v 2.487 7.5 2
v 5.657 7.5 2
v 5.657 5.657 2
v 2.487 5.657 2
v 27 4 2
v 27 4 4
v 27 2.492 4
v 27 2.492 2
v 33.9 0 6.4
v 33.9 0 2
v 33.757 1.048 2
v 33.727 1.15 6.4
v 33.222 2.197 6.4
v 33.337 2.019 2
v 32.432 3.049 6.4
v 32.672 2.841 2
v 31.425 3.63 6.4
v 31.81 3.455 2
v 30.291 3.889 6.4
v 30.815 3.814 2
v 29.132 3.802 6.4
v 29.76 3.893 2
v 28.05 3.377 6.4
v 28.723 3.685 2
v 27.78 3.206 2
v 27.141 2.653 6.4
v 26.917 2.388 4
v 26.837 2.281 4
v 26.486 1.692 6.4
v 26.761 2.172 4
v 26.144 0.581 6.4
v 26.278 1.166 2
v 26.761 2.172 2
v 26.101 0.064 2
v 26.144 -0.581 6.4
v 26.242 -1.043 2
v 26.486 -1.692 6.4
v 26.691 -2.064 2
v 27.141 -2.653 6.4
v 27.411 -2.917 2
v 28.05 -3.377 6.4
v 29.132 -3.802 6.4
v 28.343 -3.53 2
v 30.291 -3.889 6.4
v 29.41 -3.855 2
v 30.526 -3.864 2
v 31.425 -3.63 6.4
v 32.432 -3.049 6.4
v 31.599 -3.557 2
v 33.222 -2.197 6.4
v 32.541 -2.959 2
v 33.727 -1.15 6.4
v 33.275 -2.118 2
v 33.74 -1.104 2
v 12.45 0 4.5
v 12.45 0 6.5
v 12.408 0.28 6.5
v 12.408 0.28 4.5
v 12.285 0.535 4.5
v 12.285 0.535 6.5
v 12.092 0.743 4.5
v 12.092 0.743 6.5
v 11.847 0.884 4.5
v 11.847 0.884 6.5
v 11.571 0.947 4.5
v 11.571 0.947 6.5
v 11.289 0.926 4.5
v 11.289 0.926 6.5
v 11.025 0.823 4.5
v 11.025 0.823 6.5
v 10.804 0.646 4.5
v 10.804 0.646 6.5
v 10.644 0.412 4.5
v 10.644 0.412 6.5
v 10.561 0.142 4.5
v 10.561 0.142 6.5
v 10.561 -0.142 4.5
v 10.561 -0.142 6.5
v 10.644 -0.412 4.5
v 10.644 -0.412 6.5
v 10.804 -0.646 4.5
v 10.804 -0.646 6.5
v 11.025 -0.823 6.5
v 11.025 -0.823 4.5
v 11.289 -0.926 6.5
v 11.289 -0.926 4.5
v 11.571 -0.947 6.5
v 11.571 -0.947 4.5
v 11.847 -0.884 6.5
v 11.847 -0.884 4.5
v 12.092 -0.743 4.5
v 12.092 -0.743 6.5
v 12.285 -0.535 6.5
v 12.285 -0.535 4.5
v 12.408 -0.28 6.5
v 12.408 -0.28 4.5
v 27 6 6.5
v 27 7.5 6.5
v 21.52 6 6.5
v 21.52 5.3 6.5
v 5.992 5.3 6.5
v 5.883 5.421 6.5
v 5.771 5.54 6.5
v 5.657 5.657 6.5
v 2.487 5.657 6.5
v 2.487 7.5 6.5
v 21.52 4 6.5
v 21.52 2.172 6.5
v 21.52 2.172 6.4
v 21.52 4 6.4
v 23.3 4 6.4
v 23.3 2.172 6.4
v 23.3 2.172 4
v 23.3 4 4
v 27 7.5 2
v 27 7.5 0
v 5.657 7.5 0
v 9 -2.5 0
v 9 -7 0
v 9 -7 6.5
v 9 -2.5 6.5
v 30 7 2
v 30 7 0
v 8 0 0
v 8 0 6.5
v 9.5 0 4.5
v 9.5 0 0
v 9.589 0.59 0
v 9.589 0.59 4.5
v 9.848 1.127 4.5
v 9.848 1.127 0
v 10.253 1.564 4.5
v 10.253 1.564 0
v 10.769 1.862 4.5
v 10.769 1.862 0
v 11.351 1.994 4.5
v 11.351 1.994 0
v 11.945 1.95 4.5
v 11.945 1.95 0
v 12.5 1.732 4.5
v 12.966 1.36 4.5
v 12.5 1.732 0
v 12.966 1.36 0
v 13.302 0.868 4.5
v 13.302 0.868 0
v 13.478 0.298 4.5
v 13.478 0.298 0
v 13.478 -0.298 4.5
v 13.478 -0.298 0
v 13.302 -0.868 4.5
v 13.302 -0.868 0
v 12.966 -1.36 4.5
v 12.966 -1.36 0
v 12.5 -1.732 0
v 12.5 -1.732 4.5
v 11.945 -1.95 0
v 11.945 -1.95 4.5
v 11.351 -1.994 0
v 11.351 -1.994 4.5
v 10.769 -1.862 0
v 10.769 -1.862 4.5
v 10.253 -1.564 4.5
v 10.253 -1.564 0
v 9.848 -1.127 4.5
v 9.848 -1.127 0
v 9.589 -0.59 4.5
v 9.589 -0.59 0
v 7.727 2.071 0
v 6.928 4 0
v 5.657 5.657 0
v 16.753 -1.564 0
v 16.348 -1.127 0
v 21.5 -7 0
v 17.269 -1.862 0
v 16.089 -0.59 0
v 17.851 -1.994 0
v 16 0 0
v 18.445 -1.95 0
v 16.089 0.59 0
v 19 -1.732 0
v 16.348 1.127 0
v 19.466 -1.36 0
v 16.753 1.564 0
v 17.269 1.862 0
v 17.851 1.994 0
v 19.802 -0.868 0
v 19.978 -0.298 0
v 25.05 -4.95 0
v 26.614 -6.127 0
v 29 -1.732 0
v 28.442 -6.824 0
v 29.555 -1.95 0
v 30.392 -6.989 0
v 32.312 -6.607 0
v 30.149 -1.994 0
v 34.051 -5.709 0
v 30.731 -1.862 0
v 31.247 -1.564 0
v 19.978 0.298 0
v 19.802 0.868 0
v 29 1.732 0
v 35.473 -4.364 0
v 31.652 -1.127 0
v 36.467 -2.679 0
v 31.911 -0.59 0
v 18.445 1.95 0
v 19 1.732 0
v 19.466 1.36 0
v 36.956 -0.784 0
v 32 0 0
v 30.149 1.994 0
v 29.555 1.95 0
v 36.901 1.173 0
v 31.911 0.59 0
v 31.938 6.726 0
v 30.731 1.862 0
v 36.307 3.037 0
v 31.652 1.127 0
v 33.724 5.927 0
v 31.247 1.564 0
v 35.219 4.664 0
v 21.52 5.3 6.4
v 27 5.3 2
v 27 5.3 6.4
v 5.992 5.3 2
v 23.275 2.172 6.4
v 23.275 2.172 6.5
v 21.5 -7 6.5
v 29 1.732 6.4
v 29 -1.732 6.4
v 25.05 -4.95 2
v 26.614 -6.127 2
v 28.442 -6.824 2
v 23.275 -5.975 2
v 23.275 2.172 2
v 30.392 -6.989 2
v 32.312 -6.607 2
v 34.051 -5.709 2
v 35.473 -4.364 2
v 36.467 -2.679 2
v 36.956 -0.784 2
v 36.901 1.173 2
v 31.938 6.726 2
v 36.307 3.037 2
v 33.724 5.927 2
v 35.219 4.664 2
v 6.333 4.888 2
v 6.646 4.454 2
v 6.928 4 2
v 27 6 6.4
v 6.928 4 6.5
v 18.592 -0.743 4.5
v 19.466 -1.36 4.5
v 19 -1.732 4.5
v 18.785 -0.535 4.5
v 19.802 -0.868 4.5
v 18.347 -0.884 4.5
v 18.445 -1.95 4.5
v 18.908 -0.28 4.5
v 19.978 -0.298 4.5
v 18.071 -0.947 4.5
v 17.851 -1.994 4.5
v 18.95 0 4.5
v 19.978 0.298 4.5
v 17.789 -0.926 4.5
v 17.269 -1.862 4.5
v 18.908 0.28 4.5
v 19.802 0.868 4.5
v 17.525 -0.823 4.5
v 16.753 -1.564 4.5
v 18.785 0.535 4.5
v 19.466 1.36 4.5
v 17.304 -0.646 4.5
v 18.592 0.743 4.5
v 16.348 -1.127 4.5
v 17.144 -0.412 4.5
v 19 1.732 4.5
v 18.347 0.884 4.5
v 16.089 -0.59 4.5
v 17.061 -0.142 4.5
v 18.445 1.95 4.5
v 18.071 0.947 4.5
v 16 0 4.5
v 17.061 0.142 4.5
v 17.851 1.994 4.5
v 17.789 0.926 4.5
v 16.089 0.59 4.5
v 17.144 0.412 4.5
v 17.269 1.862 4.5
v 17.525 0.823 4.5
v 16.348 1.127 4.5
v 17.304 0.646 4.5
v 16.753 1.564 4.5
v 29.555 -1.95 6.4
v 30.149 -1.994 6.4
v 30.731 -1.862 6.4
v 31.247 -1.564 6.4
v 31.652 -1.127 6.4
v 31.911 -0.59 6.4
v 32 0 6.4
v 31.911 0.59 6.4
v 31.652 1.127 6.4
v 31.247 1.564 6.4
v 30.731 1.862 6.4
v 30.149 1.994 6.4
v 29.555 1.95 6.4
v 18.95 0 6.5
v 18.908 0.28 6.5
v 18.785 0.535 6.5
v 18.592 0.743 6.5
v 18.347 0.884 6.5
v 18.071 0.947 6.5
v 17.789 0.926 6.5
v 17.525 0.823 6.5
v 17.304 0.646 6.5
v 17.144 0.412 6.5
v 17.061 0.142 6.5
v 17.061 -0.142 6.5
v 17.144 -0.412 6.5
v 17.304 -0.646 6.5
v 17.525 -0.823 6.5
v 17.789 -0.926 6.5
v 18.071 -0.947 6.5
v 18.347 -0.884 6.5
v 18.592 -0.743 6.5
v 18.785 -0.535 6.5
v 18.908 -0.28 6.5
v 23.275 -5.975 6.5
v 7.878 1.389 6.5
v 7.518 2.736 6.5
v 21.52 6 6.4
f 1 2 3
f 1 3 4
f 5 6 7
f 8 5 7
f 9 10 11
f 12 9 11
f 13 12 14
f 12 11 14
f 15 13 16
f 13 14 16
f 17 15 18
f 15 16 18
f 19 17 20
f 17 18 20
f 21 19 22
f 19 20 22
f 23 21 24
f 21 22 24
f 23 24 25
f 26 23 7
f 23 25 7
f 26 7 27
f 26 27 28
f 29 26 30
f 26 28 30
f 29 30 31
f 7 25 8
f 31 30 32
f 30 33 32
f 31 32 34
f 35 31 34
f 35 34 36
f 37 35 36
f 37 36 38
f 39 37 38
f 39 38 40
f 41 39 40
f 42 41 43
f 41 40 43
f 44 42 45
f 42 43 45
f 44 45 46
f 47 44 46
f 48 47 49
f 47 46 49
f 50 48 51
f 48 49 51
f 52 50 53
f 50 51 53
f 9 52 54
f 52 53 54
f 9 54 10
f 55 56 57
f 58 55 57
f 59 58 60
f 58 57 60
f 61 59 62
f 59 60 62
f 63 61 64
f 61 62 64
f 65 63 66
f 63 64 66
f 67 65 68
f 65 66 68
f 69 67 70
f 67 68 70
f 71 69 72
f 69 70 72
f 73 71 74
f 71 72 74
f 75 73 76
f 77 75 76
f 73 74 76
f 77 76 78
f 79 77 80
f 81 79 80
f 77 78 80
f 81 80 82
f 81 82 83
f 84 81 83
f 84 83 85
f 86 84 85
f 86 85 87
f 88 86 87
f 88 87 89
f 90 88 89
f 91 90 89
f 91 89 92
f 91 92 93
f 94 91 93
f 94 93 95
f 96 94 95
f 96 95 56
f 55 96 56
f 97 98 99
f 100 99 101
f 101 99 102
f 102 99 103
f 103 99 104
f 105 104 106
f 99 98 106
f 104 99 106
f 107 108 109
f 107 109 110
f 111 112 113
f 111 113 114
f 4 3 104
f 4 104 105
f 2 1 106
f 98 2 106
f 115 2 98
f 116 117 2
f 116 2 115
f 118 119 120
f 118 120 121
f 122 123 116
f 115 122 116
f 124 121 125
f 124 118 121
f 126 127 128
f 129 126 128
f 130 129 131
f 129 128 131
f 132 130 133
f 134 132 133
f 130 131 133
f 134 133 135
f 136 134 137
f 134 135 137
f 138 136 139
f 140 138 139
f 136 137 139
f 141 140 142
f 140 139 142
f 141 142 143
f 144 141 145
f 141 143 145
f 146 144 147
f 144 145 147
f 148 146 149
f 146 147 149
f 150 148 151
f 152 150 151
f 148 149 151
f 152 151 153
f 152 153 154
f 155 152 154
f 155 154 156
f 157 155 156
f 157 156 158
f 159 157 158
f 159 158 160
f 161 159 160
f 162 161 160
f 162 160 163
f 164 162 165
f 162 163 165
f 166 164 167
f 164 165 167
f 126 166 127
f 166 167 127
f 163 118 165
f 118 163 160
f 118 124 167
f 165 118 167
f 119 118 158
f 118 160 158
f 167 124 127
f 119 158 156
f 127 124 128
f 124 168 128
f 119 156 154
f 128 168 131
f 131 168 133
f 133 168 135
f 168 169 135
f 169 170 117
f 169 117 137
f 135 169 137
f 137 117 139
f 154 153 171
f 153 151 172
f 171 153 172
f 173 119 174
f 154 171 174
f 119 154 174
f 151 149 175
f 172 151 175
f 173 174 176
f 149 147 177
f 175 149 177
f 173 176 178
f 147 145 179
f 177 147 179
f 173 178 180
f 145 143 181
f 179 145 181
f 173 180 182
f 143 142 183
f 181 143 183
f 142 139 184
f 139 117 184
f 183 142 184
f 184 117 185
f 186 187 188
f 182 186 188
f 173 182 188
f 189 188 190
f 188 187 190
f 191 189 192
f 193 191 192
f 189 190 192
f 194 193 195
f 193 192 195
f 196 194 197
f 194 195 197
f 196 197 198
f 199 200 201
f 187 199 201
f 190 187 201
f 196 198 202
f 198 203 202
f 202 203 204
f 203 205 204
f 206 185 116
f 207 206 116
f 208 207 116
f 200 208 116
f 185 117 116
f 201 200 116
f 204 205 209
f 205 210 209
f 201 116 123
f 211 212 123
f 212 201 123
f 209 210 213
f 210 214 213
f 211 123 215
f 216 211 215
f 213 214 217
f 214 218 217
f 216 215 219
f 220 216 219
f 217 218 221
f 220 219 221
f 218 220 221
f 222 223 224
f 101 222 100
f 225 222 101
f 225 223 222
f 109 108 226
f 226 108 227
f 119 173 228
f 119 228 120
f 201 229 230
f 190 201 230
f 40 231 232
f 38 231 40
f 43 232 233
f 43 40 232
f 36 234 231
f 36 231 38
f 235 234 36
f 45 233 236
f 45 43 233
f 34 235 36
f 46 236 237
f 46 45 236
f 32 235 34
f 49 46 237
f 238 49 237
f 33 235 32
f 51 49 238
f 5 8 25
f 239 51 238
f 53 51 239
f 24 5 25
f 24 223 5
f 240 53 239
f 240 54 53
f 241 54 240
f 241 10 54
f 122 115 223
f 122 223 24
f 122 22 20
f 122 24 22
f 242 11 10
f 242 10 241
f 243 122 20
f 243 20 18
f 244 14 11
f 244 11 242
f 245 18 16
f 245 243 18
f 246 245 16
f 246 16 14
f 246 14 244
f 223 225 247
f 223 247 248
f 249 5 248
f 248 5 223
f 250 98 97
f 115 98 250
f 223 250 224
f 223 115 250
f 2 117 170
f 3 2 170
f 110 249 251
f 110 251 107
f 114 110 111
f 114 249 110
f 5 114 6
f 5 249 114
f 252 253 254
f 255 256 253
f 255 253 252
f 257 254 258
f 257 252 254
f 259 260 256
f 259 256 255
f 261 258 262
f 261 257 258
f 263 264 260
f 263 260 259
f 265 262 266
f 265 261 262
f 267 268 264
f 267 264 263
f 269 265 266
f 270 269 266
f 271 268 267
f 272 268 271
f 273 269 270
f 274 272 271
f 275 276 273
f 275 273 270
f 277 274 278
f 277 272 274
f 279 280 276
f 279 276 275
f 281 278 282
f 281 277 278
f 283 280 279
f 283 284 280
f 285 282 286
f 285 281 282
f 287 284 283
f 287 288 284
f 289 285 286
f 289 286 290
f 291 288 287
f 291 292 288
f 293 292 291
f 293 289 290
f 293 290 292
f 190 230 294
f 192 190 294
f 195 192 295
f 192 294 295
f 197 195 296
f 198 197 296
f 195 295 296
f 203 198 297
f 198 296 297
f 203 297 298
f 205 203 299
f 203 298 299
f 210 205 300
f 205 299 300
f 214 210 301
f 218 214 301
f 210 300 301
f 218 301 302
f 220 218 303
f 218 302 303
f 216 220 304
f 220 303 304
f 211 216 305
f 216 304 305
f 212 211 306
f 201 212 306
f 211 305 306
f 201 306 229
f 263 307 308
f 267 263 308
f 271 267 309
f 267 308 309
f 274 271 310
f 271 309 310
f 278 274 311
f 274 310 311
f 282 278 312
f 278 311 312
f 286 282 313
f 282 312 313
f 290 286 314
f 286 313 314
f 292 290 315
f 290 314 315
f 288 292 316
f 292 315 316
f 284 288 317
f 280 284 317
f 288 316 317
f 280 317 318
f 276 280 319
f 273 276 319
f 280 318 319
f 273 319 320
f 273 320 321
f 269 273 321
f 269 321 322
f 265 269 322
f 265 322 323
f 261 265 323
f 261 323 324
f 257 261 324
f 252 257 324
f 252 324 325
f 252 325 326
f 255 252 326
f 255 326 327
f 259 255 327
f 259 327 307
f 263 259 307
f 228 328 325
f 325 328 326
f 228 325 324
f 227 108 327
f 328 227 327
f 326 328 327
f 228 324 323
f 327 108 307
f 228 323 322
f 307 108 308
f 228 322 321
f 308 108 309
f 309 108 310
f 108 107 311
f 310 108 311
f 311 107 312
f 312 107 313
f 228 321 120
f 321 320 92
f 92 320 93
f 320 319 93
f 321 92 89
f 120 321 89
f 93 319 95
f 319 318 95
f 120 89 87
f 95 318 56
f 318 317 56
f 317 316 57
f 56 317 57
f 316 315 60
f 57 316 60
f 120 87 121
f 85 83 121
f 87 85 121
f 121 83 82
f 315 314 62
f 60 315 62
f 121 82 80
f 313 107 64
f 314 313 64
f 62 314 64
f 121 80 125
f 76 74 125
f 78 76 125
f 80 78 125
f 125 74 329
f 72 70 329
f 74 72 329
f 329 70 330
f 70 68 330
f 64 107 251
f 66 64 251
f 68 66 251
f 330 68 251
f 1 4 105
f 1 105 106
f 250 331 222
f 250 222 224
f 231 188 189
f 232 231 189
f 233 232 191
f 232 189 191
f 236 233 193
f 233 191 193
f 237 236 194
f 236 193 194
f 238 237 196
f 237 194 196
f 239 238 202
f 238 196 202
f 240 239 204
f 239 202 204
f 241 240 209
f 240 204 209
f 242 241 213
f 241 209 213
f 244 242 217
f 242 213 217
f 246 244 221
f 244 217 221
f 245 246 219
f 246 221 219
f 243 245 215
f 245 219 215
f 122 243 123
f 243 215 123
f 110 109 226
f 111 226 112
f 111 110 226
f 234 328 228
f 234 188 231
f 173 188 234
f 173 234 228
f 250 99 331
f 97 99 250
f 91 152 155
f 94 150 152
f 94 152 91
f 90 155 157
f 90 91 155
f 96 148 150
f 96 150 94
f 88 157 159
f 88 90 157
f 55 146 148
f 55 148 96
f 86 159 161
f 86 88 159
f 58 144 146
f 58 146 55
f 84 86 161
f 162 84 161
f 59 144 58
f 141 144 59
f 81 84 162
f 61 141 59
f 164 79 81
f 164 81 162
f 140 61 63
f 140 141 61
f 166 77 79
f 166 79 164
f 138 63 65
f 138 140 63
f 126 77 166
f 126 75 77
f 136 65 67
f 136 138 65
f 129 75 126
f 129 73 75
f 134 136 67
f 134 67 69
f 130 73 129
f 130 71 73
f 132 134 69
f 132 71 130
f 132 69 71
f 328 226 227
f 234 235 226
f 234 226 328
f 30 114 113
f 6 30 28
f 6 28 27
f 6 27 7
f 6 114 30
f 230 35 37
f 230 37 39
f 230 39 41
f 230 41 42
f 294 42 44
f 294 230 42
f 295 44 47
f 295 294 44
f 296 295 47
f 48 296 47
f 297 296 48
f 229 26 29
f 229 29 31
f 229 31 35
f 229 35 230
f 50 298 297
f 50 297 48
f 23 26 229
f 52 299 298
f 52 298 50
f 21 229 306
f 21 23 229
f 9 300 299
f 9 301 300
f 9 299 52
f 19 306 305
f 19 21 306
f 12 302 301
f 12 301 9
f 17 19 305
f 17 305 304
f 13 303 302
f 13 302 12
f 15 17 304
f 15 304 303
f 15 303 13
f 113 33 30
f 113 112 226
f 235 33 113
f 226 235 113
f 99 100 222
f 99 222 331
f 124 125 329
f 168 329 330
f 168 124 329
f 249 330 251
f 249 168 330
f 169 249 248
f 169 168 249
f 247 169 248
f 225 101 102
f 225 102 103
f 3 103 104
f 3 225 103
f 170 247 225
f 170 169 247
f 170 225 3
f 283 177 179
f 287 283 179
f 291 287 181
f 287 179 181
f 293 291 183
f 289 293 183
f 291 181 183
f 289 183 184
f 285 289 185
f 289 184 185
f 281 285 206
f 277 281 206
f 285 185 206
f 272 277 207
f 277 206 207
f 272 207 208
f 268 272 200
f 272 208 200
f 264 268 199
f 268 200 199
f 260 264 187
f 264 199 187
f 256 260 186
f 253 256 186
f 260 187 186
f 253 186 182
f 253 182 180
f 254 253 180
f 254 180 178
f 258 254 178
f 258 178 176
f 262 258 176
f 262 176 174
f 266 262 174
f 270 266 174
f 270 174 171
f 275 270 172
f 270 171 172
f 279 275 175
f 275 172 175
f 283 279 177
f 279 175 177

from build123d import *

# Parameters (mm, degrees)
BOSS_EXTRUDE1_DEPTH  = 2
BOSS_EXTRUDE6_DEPTH  = 4.5
CUT_EXTRUDE6_DEPTH   = 4.5
BOSS_EXTRUDE14_DEPTH = 2.3
SKETCH32_R           = 2.1
CUT_EXTRUDE7_DEPTH   = 2.3
SKETCH33_W           = 12.5
SKETCH33_H           = 1.343145751
BOSS_EXTRUDE15_DEPTH = 1.2
SKETCH35_W           = 5.479645997
SKETCH35_H           = 3.827993755
CUT_EXTRUDE8_DEPTH   = 2.4
SKETCH36_W           = 3.7
SKETCH36_H           = 1.827993755
CUT_EXTRUDE9_DEPTH   = 2.4
SKETCH37_R           = 3.9
BOSS_EXTRUDE16_DEPTH = 4.4
CUT_EXTRUDE10_DEPTH  = 7.4
SKETCH43_R           = 2.5
BOSS_EXTRUDE17_DEPTH = 1.2
SKETCH44_R           = 0.95
CUT_EXTRUDE11_DEPTH  = 11
SKETCH45_R           = 2
CUT_EXTRUDE12_DEPTH  = 4.5
SKETCH52_R           = 0.75
CUT_EXTRUDE13_DEPTH  = 10


with BuildPart() as part:
    # Sketch3 → Boss-Extrude1 (new body)
    with BuildSketch(Plane.XY):
        with BuildLine():
            Line((8, 0), (9, -2.5))
            Line((9, -2.5), (9, -7))
            Line((9, -7), (21.5, -7))
            Line((21.5, -7), (25.050252532, -4.949747468))
            ThreePointArc((25.050252532, -4.949747468), (36.467156728, -2.678784027), (30, 7))
            Line((30, 7), (27, 7.5))
            Line((27, 7.5), (5.656854249, 7.5))
            Line((5.656854249, 7.5), (5.656854249, 5.656854249))
            ThreePointArc((5.656854249, 5.656854249), (7.39103626, 3.061467459), (8, 0))
        make_face()
    extrude(amount=BOSS_EXTRUDE1_DEPTH)

    # Sketch22 → Boss-Extrude6 (add)
    with BuildSketch(Plane.XY.offset(2)):
        with BuildLine():
            Line((5.656854249, 5.656854249), (2.486790148, 5.656854249))
            Line((2.486790148, 5.656854249), (2.486790148, 7.5))
            Line((2.486790148, 7.5), (5.656854249, 7.5))
            Line((5.656854249, 7.5), (21.5, 7.5))
            Line((21.5, 7.5), (27, 7.5))
            Line((27, 7.5), (27, 2.172006245))
            Line((27, 2.172006245), (23.275126266, 2.172006245))
            Line((23.275126266, 2.172006245), (23.275126266, -5.974873734))
            Line((23.275126266, -5.974873734), (21.5, -7))
            Line((21.5, -7), (9, -7))
            Line((9, -7), (9, -2.5))
            Line((9, -2.5), (8, 0))
            ThreePointArc((8, 0), (7.39103626, 3.061467459), (5.656854249, 5.656854249))
        make_face()
    extrude(amount=BOSS_EXTRUDE6_DEPTH)

    # Sketch26 → Cut-Extrude6 (cut)
    with BuildSketch(Plane.XY.offset(2)):
        Polygon((18.098080448, 5.3), (2.530052458, 5.3), (2.530052458, 4), (18.098080448, 4), (27, 4), (27, 5.3), align=None)
    extrude(amount=CUT_EXTRUDE6_DEPTH, mode=Mode.SUBTRACT)


with BuildPart() as body_2:
    # Sketch31 → Boss-Extrude14 (new body)
    with BuildSketch(Plane.XY.offset(6.5)):
        with BuildLine():
            Line((2.432688066, 5.656854249), (0, 5.656854249))
            ThreePointArc((0, 5.656854249), (-5.656854249, 0), (0, -5.656854249))
            Line((0, -5.656854249), (9, -5.656854249))
            Line((9, -5.656854249), (9, -7))
            Line((9, -7), (21.5, -7))
            Line((21.5, -7), (23.275126266, -5.974873734))
            Line((23.275126266, -5.974873734), (23.275126266, 2.172006245))
            Line((23.275126266, 2.172006245), (27, 2.172006245))
            Line((27, 2.172006245), (27, 7.5))
            Line((27, 7.5), (2.486790148, 7.5))
            Line((2.486790148, 7.5), (2.432688066, 5.656854249))
        make_face()
    extrude(amount=BOSS_EXTRUDE14_DEPTH)

    # Sketch32 → Cut-Extrude7 (cut)
    with BuildSketch(Plane.XY.offset(8.8)):
        Circle(SKETCH32_R)
    extrude(amount=-CUT_EXTRUDE7_DEPTH, mode=Mode.SUBTRACT)

    # Sketch33 → Boss-Extrude15 (add)
    with BuildSketch(Plane.XY.offset(8.8)):
        with Locations((15.25, -6.328427125)):
            Rectangle(SKETCH33_W, SKETCH33_H)
        Polygon((2.486790148, 7.5), (21.5, 7.5), (21.5, 5.656854249), (2.432688066, 5.656854249), align=None)
    extrude(amount=BOSS_EXTRUDE15_DEPTH)


with BuildPart() as cut_extrude8_tool:
    # Sketch35 → Cut-Extrude8 (new body)
    with BuildSketch(Plane.XY.offset(8.8)):
        with Locations((24.260177002, 4.086003123)):
            Rectangle(SKETCH35_W, SKETCH35_H)
    extrude(amount=-CUT_EXTRUDE8_DEPTH)


with BuildPart() as part_1:
    add(part.part)

    # Cut-Extrude8: cut by cut_extrude8_tool
    add(cut_extrude8_tool.part, mode=Mode.SUBTRACT)

    # Sketch36 → Cut-Extrude9 (cut)
    with BuildSketch(Plane.XY.offset(6.4)):
        with Locations((25.15, 3.086003123)):
            Rectangle(SKETCH36_W, SKETCH36_H)
    extrude(amount=-CUT_EXTRUDE9_DEPTH, mode=Mode.SUBTRACT)

    # Sketch37 → Boss-Extrude16 (add)
    with BuildSketch(Plane.XY.offset(2)):
        with Locations((30, 0)):
            Circle(SKETCH37_R)
    extrude(amount=BOSS_EXTRUDE16_DEPTH)

    # Sketch39 → Cut-Extrude10 (cut, through all)
    with BuildSketch(Plane.XY.offset(6.4)):
        with BuildLine():
            Line((29, 1.732050808), (29, -1.732050808))
            ThreePointArc((29, -1.732050808), (32, 0), (29, 1.732050808))
        make_face()
    extrude(amount=-CUT_EXTRUDE10_DEPTH, mode=Mode.SUBTRACT)


with BuildPart() as body_2_1:
    add(body_2.part)

    # Cut-Extrude8: cut by cut_extrude8_tool
    add(cut_extrude8_tool.part, mode=Mode.SUBTRACT)

    # Sketch43 → Boss-Extrude17 (add)
    with BuildSketch(Plane.XY.offset(8.8)):
        with Locations((11.5, 0)):
            Circle(SKETCH43_R)
        with Locations((18, 0)):
            Circle(SKETCH43_R)
    extrude(amount=BOSS_EXTRUDE17_DEPTH)


with BuildPart() as cut_extrude11_tool:
    # Sketch44 → Cut-Extrude11 (new body, through all)
    with BuildSketch(Plane.XY.offset(10)):
        with Locations((11.5, 0)):
            Circle(SKETCH44_R)
        with Locations((18, 0)):
            Circle(SKETCH44_R)
    extrude(amount=-CUT_EXTRUDE11_DEPTH)


with BuildPart() as part_2:
    add(part_1.part)

    # Cut-Extrude11: cut by cut_extrude11_tool
    add(cut_extrude11_tool.part, mode=Mode.SUBTRACT)

    # Sketch45 → Cut-Extrude12 (cut)
    with BuildSketch(Plane(origin=(0, 0, 0), x_dir=(-1, 0, 0), z_dir=(0, 0, -1))):
        with Locations((-11.5, 0)):
            Circle(SKETCH45_R)
        with Locations((-18, 0)):
            Circle(SKETCH45_R)
    extrude(amount=-CUT_EXTRUDE12_DEPTH, mode=Mode.SUBTRACT)


with BuildPart() as body_2_2:
    add(body_2_1.part)

    # Cut-Extrude11: cut by cut_extrude11_tool
    add(cut_extrude11_tool.part, mode=Mode.SUBTRACT)

    # Sketch52 → Cut-Extrude13 (cut, along a direction that is not the sketch's normal)
    with BuildSketch(Plane.XZ.offset(-5.656854249)):
        with Locations((18.235476819, 10)):
            Circle(SKETCH52_R)
    extrude(amount=-CUT_EXTRUDE13_DEPTH, dir=(0.640410196, -0.76803306, 0), mode=Mode.SUBTRACT)


solid = part_2.part
